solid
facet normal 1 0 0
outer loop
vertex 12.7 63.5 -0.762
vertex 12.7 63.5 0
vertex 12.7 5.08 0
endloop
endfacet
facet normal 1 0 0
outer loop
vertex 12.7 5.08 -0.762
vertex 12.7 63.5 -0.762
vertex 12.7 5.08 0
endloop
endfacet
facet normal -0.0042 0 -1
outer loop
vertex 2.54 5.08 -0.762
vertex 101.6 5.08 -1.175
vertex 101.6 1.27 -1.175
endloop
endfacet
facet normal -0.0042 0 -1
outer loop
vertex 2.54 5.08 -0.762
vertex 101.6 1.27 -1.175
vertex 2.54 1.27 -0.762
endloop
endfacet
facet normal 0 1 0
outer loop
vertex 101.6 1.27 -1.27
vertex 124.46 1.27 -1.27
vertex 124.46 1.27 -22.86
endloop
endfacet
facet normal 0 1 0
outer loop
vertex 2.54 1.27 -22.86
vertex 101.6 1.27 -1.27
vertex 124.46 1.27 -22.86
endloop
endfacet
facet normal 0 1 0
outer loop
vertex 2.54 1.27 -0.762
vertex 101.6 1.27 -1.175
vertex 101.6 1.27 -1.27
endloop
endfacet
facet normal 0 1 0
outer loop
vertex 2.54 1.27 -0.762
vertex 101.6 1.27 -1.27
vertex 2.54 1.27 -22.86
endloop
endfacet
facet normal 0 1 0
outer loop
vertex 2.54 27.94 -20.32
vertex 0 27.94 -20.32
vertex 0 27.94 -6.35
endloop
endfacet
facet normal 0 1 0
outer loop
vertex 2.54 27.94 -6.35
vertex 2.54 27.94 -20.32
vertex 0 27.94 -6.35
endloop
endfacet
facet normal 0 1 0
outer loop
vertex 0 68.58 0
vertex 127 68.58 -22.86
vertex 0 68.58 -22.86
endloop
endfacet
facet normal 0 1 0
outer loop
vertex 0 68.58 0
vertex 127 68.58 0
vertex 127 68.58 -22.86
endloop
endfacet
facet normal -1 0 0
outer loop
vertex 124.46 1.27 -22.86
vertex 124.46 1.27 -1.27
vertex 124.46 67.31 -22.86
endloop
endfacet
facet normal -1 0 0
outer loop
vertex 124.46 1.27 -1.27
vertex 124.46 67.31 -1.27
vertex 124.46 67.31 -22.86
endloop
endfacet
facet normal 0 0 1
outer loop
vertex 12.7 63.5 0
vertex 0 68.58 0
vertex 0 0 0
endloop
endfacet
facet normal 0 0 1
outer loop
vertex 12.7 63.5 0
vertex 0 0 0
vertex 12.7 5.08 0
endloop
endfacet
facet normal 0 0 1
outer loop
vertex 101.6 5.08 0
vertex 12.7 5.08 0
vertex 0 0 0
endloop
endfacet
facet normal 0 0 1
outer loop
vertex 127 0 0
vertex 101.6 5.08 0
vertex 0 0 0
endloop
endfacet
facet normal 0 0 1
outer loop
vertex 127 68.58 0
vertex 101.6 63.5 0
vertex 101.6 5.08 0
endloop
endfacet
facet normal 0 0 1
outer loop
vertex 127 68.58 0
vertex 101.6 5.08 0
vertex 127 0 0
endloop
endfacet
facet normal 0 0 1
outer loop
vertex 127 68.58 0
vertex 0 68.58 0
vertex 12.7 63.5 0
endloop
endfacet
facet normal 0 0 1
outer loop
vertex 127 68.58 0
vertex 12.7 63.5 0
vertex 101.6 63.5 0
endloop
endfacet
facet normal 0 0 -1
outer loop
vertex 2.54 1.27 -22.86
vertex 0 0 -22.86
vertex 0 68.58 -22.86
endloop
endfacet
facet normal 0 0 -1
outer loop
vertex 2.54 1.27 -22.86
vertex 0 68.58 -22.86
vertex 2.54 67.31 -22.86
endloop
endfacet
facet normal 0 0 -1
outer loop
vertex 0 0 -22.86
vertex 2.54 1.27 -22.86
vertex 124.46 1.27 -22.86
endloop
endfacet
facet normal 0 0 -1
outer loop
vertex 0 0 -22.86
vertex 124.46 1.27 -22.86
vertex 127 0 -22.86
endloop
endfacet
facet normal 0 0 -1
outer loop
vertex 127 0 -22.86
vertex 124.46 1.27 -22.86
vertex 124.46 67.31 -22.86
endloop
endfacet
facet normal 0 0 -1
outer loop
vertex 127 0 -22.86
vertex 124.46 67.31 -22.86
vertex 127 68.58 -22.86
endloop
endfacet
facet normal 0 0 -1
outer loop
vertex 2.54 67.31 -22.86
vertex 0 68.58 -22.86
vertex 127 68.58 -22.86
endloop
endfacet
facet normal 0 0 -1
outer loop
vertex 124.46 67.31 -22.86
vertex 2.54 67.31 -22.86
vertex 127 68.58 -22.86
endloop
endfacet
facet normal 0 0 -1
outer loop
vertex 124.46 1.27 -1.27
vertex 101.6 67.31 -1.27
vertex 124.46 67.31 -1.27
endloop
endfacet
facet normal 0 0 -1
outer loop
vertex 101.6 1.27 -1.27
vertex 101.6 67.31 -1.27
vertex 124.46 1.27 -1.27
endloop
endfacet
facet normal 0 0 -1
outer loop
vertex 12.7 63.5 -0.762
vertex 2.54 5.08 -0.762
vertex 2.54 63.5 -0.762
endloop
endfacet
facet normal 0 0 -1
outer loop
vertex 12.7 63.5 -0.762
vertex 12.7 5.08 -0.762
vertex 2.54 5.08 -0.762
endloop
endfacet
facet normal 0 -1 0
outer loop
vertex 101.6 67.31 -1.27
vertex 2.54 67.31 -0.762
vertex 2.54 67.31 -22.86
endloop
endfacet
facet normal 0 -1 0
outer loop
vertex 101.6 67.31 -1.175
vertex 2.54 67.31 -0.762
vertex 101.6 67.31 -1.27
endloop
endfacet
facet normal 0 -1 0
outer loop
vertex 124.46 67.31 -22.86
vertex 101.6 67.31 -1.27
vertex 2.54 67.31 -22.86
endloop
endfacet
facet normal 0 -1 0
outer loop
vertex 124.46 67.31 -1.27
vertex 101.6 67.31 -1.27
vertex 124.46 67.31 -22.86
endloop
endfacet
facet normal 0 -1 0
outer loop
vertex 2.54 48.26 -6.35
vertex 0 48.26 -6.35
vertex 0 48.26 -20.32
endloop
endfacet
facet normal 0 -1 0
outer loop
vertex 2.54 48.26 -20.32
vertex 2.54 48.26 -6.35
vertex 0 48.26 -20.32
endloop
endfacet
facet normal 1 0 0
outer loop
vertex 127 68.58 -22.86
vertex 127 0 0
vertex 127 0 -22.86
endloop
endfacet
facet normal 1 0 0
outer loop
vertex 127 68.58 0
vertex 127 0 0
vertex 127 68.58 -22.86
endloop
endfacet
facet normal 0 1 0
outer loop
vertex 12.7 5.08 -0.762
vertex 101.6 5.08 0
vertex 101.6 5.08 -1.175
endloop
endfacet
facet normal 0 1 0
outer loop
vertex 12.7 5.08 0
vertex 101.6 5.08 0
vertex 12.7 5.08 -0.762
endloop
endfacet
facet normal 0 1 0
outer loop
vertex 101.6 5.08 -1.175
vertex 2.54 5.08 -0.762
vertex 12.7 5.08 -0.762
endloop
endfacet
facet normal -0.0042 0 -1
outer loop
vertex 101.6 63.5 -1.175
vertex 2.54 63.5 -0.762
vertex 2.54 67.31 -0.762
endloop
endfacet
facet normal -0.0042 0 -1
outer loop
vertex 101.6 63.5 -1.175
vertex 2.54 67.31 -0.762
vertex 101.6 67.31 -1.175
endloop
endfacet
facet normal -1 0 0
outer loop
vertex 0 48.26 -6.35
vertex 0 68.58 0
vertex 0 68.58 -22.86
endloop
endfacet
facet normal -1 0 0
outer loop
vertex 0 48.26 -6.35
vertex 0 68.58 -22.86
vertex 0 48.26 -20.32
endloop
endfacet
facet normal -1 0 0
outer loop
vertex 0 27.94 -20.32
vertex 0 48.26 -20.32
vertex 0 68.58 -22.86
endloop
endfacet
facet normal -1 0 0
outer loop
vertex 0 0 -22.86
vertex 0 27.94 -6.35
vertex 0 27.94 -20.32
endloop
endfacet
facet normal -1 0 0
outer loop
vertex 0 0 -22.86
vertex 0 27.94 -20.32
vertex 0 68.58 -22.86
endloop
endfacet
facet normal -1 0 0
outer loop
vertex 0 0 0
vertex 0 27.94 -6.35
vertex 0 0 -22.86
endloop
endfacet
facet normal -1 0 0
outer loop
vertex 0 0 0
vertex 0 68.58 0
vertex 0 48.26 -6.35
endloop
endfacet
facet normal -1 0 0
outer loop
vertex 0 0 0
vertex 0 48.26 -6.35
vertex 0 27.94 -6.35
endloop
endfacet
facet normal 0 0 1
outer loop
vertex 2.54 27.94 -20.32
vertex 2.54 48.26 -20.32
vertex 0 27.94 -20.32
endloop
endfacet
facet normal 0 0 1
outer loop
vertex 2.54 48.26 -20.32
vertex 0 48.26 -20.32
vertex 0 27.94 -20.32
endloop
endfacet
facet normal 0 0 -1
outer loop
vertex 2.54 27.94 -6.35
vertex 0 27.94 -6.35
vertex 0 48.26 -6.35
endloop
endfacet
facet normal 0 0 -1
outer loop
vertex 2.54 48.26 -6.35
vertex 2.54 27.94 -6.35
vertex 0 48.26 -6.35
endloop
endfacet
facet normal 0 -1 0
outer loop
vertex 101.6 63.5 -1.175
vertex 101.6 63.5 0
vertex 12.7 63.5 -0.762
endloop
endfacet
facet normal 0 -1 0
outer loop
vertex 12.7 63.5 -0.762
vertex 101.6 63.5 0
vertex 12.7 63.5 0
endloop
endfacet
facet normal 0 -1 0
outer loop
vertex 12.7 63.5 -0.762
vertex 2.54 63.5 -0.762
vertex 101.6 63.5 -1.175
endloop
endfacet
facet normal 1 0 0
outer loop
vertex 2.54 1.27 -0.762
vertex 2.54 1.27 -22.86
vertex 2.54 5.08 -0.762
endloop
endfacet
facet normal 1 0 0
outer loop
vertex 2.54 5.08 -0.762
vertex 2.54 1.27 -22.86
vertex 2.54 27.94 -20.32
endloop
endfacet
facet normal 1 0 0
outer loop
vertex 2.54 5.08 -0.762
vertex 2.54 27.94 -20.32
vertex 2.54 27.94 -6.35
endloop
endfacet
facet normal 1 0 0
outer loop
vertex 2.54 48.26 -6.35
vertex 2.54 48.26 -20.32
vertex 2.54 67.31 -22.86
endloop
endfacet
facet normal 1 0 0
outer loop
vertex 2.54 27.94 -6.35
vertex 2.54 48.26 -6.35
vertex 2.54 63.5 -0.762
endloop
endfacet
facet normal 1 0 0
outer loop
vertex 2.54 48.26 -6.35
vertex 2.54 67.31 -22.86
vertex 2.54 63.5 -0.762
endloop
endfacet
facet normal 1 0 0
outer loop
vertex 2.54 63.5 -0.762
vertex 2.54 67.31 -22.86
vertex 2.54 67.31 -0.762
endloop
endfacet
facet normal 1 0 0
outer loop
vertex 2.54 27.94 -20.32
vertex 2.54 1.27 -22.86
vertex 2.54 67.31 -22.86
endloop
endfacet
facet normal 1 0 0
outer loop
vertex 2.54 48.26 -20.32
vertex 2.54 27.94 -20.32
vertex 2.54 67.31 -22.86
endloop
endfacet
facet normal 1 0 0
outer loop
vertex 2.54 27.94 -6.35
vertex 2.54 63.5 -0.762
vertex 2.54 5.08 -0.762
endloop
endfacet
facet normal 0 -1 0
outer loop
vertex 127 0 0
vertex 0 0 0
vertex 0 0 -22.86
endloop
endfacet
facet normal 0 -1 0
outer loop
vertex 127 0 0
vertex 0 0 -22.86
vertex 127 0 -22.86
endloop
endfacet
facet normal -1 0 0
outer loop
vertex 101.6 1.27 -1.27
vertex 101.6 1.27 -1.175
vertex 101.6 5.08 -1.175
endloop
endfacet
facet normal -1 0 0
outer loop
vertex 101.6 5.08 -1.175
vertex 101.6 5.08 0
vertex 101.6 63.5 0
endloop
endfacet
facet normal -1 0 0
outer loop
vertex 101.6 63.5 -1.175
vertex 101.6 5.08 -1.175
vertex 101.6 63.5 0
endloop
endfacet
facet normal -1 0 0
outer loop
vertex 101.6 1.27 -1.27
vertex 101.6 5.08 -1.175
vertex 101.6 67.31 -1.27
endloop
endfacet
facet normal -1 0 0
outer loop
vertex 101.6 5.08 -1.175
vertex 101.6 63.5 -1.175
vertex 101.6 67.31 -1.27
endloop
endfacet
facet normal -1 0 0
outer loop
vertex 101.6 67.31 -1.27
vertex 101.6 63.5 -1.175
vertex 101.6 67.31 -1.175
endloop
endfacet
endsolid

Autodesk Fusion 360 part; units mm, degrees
sketch "Sketch1" plane through (0, 0, 0) normal (0, 0, 1) x (1, 0, 0)
  line L0 (0, 0) -> (127, 0)
  line L1 (127, 0) -> (127, 68.58)
  line L2 (127, 68.58) -> (0, 68.58)
  line L3 (0, 68.58) -> (0, 0)
  line L4 (0, 0) -> (0, 34.29)
  line L5 (0, 34.29) -> (12.7, 34.29)
  line L6 (101.6, 0) -> (101.6, 63.5)
  line L7 (101.6, 63.5) -> (12.7, 63.5)
  line L8 (12.7, 63.5) -> (12.7, 0)
  line L9 (101.6, 5.08) -> (12.7, 5.08)
  dimension "d1" = 127
  dimension "d2" = 68.58
  dimension "d3" = 34.29
  dimension "d4" = 12.7
  dimension "d6" = 63.5
extrude "Extrude1" add sketch "Sketch1" against normal blind 22.86 contours L0 L3 L4 L5 L8 | L0 L6 L8 L9 | L0 L1 L2 L3 L5 L6 L7 L8
sketch "Sketch2" plane through (0, 0, 0) normal (-1, 0, 0) x (0, -1, 0)
  line L0 (0, 0) -> (-68.58, 0)
  line L1 (-68.58, 0) -> (-68.58, -22.86)
  line L2 (-68.58, -22.86) -> (0, -22.86)
  line L3 (0, -22.86) -> (0, 0)
  line L4 (-68.58, -22.86) -> (-68.58, -20.32)
  line L5 (-27.94, -20.32) -> (-27.94, -6.35)
  line L6 (-27.94, -6.35) -> (-48.26, -6.35)
  line L7 (-48.26, -6.35) -> (-48.26, -20.32)
  line L8 (-48.26, -20.32) -> (-27.94, -20.32)
  dimension "d12" = 13.97
extrude "Extrude2" cut sketch "Sketch2" against normal blind 5.08 contours L5 L6 L7 L8
sketch "Sketch3" plane through (101.6, 0, 0) normal (-1, 0, 0) x (0, -1, 0)
  line L0 (-5.08, 0) -> (-63.5, 0)
  line L1 (-63.5, 0) -> (-63.5, -22.86)
  line L2 (-63.5, -22.86) -> (-5.08, -22.86)
  line L3 (-5.08, -22.86) -> (-5.08, 0)
  line L4 (-63.5, -22.86) -> (-63.5, -1.27)
  line L5 (-63.5, -1.27) -> (-5.08, -1.27)
  line L6 (-5.08, -22.86) -> (-5.08, -1.27)
  line L7 (-63.5, -22.86) -> (-5.08, -22.86)
extrude "Extrude3" cut sketch "Sketch3" against normal blind 22.86 contours L1 L2 L3 L4 L5 L6 L7
sketch "Sketch4" plane through (12.7, 0, 0) normal (1, 0, 0) x (0, 1, 0)
  line L0 (63.5, 0) -> (5.08, 0)
  line L1 (5.08, 0) -> (5.08, -22.86)
  line L2 (5.08, -22.86) -> (63.5, -22.86)
  line L3 (63.5, -22.86) -> (63.5, 0)
  line L4 (5.08, -22.86) -> (5.08, -0.762)
  line L5 (5.08, -0.762) -> (63.5, -0.762)
  line L6 (63.5, -22.86) -> (63.5, -0.762)
  line L7 (63.5, -22.86) -> (5.08, -22.86)
extrude "Extrude4" cut sketch "Sketch4" against normal blind 10.16 contours L1 L2 L3 L4 L5 L6 L7
sketch "Sketch5" plane through (0, 63.5, 0) normal (0, -1, 0) x (1, 0, 0)
  line L0 (101.6, 0) -> (12.7, 0)
  line L1 (12.7, 0) -> (12.7, -0.762)
  line L2 (12.7, -0.762) -> (2.54, -0.762)
  line L3 (2.54, -0.762) -> (2.54, -22.86)
  line L4 (2.54, -22.86) -> (124.46, -22.86)
  line L5 (124.46, -22.86) -> (124.46, -1.27)
  line L6 (124.46, -1.27) -> (101.6, -1.27)
  line L7 (101.6, -1.27) -> (101.6, 0)
  line L8 (2.54, -0.762) -> (124.46, -1.27)
  line L9 (124.46, -22.86) -> (2.54, -22.86)
  line L10 (2.54, -0.762) -> (2.54, -21.3653)
extrude "Extrude5" cut sketch "Sketch5" against normal blind 3.81 contours L3 L4 L5 L6 L7 L8 L9 L10
sketch "Sketch6" plane through (0, 5.08, 0) normal (0, 1, 0) x (-1, 0, 0)
  line L0 (-12.7, 0) -> (-101.6, 0)
  line L1 (-101.6, 0) -> (-101.6, -1.27)
  line L2 (-101.6, -1.27) -> (-124.46, -1.27)
  line L3 (-124.46, -1.27) -> (-124.46, -22.86)
  line L4 (-124.46, -22.86) -> (-2.54, -22.86)
  line L5 (-2.54, -22.86) -> (-2.54, -0.762)
  line L6 (-2.54, -0.762) -> (-12.7, -0.762)
  line L7 (-12.7, -0.762) -> (-12.7, 0)
  line L8 (-124.46, -1.27) -> (-2.54, -0.762)
  line L9 (-2.54, -22.86) -> (-124.46, -22.86)
  line L10 (-124.46, -1.27) -> (-124.46, -22.86)
extrude "Extrude6" cut sketch "Sketch6" against normal blind 3.81 contours L1 L2 L3 L4 L5 L8 L9 L10
